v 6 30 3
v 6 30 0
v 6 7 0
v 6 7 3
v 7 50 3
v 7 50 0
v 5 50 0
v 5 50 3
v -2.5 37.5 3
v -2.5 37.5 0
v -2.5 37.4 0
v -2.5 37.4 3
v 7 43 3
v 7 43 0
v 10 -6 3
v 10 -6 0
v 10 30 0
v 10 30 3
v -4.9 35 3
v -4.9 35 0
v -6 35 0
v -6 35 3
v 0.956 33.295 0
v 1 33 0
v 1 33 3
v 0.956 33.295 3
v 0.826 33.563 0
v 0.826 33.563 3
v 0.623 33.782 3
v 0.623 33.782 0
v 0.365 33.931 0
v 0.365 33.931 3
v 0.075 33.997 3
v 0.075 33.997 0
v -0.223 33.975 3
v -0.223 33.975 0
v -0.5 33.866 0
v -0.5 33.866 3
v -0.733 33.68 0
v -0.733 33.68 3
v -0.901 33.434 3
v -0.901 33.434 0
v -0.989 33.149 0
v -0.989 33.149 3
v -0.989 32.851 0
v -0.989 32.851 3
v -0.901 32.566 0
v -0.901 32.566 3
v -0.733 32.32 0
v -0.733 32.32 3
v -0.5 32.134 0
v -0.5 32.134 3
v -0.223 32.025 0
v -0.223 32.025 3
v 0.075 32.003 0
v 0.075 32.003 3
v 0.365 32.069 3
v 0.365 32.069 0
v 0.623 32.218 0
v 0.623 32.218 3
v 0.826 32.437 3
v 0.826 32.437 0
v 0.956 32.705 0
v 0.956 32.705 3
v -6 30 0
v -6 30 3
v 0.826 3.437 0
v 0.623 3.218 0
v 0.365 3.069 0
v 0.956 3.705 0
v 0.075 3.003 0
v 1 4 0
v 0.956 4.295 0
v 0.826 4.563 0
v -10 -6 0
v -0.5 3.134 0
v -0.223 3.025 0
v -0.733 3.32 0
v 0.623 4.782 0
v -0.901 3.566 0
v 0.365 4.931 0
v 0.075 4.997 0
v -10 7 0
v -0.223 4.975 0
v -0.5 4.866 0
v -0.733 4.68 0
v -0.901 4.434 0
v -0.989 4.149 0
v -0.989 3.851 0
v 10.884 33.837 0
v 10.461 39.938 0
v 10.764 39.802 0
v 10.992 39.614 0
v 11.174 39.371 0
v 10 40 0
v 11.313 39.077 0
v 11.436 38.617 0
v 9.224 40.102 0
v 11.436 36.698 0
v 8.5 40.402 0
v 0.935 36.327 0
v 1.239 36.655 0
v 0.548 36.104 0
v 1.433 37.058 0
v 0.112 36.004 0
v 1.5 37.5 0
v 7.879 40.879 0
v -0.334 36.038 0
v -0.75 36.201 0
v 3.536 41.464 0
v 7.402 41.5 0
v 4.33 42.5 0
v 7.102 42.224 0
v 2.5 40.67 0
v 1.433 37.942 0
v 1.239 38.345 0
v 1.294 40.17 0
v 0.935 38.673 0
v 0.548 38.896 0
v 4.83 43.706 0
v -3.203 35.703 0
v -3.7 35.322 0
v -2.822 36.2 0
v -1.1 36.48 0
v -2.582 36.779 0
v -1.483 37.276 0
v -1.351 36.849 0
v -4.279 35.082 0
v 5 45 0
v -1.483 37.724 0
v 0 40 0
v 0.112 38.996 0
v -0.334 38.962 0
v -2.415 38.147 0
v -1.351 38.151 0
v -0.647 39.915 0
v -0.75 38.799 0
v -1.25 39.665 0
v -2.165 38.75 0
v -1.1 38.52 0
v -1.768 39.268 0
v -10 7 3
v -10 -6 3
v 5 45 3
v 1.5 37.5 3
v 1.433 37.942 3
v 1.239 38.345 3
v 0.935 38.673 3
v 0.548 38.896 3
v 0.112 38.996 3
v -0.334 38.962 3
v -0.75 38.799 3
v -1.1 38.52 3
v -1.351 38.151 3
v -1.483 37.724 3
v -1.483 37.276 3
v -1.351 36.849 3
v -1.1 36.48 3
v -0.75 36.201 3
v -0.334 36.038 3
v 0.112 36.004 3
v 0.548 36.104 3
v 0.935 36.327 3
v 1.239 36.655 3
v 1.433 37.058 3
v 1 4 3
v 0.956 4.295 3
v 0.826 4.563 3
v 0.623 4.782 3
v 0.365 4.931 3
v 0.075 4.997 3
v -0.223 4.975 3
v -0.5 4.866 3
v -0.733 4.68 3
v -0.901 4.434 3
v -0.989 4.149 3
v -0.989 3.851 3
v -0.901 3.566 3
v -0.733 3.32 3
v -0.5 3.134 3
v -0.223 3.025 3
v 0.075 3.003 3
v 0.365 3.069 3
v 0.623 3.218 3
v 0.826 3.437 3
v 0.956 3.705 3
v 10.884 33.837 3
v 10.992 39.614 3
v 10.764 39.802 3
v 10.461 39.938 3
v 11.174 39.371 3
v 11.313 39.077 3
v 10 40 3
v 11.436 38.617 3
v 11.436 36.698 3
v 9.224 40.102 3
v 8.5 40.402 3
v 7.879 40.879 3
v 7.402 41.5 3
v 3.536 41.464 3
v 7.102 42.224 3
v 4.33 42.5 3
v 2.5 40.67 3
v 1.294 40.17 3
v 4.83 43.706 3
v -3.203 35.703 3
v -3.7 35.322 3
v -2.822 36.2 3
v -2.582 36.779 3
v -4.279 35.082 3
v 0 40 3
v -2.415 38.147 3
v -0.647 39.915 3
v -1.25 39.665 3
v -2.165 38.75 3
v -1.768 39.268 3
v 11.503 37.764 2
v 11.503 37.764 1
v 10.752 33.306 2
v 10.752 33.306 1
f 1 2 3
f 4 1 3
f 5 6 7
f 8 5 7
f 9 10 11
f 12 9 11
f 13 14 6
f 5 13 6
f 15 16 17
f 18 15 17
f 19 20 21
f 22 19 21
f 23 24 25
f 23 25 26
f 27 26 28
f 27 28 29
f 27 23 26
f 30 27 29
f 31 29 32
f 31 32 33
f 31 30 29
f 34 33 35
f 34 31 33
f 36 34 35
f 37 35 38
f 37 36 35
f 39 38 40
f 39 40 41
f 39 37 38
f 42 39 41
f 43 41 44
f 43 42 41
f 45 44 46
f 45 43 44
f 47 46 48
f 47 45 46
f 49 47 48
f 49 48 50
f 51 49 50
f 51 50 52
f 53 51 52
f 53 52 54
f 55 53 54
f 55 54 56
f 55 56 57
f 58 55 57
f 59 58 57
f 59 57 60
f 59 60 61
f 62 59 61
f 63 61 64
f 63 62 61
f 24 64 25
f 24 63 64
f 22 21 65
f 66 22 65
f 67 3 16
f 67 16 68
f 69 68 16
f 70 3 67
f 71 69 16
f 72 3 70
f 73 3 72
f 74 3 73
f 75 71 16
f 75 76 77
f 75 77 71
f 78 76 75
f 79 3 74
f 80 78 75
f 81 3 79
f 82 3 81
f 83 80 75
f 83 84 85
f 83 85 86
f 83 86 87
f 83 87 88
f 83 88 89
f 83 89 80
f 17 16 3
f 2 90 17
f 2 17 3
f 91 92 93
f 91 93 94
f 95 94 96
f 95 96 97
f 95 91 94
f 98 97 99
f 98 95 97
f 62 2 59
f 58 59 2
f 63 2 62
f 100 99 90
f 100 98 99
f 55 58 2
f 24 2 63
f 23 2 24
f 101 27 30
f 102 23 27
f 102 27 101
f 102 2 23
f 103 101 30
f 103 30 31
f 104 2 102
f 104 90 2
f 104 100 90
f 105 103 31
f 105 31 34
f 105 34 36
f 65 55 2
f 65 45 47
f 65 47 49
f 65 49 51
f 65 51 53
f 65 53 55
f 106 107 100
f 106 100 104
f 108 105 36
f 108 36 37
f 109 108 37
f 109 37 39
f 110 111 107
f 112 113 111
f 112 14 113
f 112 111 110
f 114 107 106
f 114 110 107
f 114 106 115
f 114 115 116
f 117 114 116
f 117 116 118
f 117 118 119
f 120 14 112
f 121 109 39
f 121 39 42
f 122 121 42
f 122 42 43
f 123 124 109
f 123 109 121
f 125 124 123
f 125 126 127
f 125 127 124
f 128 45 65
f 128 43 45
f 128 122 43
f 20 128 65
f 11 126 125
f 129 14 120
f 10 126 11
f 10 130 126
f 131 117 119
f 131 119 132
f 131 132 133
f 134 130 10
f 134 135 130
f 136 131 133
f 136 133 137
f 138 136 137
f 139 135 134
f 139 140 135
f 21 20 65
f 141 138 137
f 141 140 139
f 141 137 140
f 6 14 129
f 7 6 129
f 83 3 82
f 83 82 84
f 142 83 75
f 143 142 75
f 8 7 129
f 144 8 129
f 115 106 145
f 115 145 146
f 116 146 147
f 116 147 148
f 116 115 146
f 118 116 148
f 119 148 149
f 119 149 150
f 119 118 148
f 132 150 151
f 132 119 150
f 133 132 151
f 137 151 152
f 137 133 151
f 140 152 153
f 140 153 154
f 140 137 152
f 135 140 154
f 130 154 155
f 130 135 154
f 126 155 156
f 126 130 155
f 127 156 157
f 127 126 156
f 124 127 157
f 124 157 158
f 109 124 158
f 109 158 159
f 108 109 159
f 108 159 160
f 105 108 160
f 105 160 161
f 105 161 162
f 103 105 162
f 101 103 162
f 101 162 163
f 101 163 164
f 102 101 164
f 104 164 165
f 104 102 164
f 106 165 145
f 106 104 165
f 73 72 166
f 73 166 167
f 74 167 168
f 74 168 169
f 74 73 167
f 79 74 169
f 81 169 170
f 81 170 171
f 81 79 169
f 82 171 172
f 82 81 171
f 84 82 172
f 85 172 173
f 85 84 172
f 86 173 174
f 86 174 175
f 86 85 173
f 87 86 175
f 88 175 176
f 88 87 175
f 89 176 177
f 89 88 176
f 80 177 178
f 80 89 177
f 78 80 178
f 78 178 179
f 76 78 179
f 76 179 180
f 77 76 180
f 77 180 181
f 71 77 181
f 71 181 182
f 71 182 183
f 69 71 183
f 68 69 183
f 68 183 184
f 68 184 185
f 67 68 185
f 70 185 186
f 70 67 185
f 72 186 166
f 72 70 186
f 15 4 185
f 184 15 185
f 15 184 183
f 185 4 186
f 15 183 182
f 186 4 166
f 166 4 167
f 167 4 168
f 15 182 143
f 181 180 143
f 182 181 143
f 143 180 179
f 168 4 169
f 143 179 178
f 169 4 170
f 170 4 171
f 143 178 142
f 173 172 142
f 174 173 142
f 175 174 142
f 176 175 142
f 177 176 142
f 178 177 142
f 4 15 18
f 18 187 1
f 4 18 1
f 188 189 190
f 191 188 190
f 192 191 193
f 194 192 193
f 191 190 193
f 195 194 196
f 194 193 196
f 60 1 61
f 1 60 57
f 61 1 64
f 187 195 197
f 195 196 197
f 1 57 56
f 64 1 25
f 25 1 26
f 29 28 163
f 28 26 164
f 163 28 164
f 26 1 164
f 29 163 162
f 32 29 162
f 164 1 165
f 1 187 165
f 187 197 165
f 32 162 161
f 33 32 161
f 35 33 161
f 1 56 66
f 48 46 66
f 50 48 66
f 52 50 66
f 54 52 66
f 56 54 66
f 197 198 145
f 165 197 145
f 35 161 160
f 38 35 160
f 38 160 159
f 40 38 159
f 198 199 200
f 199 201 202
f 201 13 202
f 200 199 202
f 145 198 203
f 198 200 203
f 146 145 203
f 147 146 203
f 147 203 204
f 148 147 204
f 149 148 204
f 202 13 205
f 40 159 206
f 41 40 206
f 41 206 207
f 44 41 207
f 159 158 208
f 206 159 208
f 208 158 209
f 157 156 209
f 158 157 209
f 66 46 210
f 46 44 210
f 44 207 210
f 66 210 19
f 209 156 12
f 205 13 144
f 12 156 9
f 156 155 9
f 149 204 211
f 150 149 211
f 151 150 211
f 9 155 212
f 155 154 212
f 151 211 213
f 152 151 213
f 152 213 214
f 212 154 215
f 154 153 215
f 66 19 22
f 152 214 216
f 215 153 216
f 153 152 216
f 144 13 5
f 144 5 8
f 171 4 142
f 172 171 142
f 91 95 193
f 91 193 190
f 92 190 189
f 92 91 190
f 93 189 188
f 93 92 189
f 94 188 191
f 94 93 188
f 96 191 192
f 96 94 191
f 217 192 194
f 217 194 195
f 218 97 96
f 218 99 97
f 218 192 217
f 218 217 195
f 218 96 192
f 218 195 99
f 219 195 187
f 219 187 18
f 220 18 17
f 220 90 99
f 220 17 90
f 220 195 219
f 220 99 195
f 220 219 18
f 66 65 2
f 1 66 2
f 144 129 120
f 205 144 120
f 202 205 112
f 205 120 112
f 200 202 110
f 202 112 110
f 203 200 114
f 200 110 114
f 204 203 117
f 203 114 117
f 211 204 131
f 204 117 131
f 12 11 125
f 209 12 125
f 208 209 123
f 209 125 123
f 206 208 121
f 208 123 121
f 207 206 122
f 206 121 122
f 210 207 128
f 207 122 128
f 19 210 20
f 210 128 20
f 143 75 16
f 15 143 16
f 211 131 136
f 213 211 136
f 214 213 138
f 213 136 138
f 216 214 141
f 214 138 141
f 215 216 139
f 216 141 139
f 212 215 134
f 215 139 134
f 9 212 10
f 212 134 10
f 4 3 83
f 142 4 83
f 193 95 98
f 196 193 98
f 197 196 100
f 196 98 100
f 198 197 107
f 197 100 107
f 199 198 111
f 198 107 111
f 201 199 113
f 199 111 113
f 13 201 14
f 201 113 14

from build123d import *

# Parameters (mm, degrees)
CROQUIS2_R              = 1.5
CROQUIS2_R_2            = 1
SALIENTE_EXTRUIR1_DEPTH = 3


with BuildPart() as part:
    # Croquis2 → Saliente-Extruir1 (new body)
    with BuildSketch(Plane.XY):
        with BuildLine():
            Line((10, 0), (10, 30))
            add(Edge.make_bspline(
                [(10, 40), (13.382456464, 40), (10, 31.604422757), (10, 30)],
                knots=[0, 0, 0, 0, 1, 1, 1, 1], degree=3))
            ThreePointArc((10, 40), (7.878679656, 40.878679656), (7, 43))
            Line((7, 43), (7, 50))
            Line((7, 50), (5, 50))
            Line((5, 50), (5, 45))
            ThreePointArc((5, 45), (3.535533906, 41.464466094), (0, 40))
            ThreePointArc((0, 40), (-1.767766953, 39.267766953), (-2.5, 37.5))
            Line((-2.5, 37.5), (-2.5, 37.4))
            ThreePointArc((-2.5, 37.4), (-3.202943725, 35.702943725), (-4.9, 35))
            Line((-4.9, 35), (-6, 35))
            Line((-6, 35), (-6, 30))
            Line((-6, 30), (6, 30))
            Line((6, 30), (6, 7))
            Line((6, 7), (-10, 7))
            Line((-10, 7), (-10, 0))
            Line((-10, 0), (-10, -6))
            Line((-10, -6), (10, -6))
            Line((10, -6), (10, 0))
        make_face()
        with Locations((0, 37.5)):
            Circle(CROQUIS2_R, mode=Mode.SUBTRACT)
        with Locations((0, 33)):
            Circle(CROQUIS2_R_2, mode=Mode.SUBTRACT)
        with Locations((0, 4)):
            Circle(CROQUIS2_R_2, mode=Mode.SUBTRACT)
    extrude(amount=SALIENTE_EXTRUIR1_DEPTH)


solid = part.part
